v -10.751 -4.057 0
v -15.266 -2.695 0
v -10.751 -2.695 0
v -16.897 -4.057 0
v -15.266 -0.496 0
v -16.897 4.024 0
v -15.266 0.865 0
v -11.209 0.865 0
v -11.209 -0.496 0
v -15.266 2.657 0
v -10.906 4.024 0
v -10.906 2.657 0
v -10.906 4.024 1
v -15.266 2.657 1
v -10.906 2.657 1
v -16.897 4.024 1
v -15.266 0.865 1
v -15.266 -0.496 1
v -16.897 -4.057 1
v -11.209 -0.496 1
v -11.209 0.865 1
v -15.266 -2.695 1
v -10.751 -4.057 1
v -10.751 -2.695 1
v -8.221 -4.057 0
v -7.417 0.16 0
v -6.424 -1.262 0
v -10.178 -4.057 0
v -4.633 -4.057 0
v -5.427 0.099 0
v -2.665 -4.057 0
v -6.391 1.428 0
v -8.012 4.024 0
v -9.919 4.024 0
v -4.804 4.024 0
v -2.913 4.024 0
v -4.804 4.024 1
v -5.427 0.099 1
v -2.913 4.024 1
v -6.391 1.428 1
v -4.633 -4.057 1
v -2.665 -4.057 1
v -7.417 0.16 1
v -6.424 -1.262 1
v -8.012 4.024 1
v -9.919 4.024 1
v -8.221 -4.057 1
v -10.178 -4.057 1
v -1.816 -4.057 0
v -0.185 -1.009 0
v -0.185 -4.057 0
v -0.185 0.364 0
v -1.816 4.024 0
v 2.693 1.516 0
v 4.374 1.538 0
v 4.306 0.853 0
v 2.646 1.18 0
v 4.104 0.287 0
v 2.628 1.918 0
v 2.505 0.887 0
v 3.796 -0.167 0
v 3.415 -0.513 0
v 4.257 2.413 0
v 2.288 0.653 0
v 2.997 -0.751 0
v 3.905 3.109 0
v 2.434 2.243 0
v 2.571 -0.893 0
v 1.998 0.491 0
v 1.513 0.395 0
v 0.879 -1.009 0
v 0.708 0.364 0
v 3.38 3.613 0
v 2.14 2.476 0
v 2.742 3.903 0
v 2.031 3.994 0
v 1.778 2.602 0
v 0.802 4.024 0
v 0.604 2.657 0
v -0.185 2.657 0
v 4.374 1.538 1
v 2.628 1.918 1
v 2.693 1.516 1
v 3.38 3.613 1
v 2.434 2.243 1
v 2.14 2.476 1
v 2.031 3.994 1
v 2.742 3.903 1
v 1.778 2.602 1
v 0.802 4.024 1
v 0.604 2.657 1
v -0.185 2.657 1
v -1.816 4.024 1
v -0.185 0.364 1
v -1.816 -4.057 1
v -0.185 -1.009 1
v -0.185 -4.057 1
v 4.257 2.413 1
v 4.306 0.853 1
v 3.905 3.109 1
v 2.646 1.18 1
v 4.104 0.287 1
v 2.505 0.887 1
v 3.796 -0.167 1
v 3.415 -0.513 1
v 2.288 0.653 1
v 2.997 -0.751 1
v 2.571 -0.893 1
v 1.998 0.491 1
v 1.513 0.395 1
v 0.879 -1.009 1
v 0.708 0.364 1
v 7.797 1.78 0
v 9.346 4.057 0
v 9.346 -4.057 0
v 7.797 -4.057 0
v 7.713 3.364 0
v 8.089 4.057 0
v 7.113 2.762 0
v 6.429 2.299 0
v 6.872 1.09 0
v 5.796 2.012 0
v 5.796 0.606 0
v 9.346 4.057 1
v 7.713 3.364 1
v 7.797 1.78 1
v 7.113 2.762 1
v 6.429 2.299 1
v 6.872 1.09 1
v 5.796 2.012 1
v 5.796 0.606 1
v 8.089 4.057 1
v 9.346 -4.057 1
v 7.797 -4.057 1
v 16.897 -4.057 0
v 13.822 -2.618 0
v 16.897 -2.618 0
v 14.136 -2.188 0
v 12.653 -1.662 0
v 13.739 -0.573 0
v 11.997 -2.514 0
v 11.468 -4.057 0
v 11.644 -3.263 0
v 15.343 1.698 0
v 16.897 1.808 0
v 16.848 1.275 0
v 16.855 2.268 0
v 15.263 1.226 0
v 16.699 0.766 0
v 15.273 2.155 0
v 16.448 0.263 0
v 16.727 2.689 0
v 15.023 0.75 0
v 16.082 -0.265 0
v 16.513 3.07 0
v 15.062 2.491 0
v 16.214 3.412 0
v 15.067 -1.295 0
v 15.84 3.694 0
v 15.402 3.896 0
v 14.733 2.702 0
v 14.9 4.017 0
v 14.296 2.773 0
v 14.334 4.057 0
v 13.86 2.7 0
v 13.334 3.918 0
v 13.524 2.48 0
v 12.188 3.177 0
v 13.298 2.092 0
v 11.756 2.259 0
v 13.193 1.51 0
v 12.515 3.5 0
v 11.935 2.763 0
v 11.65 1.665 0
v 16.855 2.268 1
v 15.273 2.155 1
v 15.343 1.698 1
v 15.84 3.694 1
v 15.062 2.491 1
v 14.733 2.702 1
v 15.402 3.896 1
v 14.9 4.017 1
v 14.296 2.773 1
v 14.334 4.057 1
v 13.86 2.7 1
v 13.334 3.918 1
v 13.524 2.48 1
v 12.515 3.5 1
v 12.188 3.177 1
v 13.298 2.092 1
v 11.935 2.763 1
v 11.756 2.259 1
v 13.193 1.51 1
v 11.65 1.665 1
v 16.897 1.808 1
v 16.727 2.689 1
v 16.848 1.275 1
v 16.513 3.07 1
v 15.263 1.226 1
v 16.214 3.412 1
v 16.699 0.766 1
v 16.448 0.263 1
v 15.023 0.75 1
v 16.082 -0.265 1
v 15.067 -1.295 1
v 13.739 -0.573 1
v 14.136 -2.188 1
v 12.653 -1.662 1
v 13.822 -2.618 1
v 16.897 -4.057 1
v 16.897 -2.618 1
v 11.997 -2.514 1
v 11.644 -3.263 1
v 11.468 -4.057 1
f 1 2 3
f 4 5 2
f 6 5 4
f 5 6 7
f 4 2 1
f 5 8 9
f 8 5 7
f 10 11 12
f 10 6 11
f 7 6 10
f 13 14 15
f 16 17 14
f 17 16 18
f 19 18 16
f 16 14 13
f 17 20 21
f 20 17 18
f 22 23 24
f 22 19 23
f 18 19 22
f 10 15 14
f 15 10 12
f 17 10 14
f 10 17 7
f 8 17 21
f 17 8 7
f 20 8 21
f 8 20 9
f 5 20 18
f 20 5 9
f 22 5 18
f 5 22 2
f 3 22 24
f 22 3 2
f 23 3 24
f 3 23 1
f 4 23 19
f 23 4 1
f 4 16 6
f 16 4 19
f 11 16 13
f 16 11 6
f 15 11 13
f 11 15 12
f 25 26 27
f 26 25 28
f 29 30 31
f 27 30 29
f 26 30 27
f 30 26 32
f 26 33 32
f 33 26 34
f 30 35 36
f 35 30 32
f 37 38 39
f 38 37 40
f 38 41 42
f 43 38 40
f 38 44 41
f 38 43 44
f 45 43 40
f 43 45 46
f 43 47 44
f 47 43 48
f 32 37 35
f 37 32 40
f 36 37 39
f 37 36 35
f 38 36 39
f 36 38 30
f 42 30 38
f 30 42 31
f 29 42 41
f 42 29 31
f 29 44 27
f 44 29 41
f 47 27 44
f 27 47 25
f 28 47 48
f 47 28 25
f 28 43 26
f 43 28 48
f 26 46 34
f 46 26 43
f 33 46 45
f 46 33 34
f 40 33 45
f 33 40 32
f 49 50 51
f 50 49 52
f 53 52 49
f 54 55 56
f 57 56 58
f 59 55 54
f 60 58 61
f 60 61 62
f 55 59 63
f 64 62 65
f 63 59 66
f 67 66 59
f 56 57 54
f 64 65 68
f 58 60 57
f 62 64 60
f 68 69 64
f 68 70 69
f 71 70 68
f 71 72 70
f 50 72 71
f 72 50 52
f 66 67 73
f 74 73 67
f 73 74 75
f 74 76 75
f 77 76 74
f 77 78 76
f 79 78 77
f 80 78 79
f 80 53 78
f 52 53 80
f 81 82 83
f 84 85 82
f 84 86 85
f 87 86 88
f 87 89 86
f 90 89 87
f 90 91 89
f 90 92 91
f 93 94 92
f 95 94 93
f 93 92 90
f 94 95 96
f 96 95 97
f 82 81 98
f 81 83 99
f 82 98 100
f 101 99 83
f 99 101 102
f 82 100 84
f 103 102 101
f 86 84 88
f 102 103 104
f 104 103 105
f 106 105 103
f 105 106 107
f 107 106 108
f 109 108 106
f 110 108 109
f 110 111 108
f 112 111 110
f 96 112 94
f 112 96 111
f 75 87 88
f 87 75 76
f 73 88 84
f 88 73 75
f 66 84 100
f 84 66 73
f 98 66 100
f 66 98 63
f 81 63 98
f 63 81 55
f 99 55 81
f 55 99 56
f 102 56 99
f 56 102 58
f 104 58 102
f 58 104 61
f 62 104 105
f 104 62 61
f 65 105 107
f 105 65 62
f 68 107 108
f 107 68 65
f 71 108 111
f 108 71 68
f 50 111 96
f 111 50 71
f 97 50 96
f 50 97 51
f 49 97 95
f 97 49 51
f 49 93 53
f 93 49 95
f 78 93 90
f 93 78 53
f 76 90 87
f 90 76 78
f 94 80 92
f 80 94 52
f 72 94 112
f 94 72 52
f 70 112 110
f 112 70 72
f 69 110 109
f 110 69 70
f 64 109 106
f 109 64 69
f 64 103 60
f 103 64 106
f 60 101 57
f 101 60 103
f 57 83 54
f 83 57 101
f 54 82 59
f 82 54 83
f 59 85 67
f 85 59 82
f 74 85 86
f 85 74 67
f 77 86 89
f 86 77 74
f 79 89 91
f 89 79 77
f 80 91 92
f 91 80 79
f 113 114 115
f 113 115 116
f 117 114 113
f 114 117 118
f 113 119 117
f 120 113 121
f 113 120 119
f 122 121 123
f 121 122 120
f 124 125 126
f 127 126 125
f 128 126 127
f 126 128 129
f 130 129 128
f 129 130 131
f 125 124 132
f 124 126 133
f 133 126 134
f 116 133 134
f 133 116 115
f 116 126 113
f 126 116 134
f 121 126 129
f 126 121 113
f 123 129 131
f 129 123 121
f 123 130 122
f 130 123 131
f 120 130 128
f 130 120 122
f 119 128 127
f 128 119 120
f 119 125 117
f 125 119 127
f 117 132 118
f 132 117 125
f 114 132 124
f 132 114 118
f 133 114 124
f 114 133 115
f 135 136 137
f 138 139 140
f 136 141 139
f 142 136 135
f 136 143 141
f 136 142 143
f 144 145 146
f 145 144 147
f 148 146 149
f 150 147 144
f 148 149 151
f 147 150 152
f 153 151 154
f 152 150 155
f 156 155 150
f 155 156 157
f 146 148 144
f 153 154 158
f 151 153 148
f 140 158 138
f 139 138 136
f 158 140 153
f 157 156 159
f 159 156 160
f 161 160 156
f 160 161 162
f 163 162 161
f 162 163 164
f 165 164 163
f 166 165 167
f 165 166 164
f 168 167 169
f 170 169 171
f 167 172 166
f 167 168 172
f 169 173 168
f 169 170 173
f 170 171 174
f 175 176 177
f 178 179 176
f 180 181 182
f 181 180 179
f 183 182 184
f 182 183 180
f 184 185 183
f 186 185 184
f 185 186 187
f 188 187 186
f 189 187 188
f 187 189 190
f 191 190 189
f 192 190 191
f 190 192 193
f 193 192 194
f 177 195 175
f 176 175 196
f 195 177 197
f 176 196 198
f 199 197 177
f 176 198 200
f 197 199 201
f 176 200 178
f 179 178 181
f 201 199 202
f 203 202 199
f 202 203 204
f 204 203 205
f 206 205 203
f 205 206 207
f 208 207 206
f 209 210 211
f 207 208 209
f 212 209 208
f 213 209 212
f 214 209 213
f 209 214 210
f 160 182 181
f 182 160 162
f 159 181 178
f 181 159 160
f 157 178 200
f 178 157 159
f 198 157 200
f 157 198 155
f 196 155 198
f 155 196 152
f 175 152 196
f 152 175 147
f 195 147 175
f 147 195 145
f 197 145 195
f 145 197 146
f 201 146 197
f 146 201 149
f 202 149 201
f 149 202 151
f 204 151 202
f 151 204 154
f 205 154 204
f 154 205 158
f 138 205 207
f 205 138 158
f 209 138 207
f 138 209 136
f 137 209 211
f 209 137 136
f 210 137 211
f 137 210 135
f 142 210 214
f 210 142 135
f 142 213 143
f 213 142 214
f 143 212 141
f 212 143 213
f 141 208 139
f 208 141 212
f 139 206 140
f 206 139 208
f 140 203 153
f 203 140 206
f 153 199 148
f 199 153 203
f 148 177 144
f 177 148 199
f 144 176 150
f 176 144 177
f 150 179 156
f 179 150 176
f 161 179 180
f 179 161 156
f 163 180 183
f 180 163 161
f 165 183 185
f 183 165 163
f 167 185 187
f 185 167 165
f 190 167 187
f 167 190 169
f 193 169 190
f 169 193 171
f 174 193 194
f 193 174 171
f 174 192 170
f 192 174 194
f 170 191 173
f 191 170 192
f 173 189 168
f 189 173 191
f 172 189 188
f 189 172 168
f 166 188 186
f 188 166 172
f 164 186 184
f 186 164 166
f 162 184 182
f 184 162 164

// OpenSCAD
// Module names are of the form poly_<inkscape-path-id>().
// As a result you can associate a polygon in this OpenSCAD program with the
//  corresponding SVG element in the Inkscape document by looking for 
//  the XML element with the attribute id="inkscape-path-id".

// Paths have their own variables so they can be imported and used 
//  in polygon(points) structures in other programs.
// The NN_points is the list of all polygon XY vertices. 
// There may be an NN_paths variable as well. If it exists then it 
//  defines the nested paths. Both must be used in the 
//  polygon(points, paths) variant of the command.

profile_scale = 25.4/90; //made in inkscape in mm

// helper functions to determine the X,Y dimensions of the profiles
function min_x(shape_points) = min([ for (x = shape_points) min(x[0])]);
function max_x(shape_points) = max([ for (x = shape_points) max(x[0])]);
function min_y(shape_points) = min([ for (x = shape_points) min(x[1])]);
function max_y(shape_points) = max([ for (x = shape_points) max(x[1])]);

height = 1;
width = 1.0;


E_pisemno_points = [[-59.873045,14.375000],[-59.873045,-14.257820],[-38.642575,-14.257820],[-38.642575,-9.414070],[-54.091795,-9.414070],[-54.091795,-3.066410],[-39.716795,-3.066410],[-39.716795,1.757810],[-54.091795,1.757810],[-54.091795,9.550780],[-38.095705,9.550780],[-38.095705,14.375000],[-59.873045,14.375000],[-59.873045,14.375000]];

module E_pisemno(h, w, res=4)  {
  scale([profile_scale, -profile_scale, 1])
  union()  {
    linear_extrude(height=h)
      polygon(E_pisemno_points);
  }
}

X_pisemno_points = [[-36.064455,14.375000],[-26.279295,-0.566410],[-35.146485,-14.257820],[-28.388675,-14.257820],[-22.646485,-5.058600],[-17.021485,-14.257820],[-10.322265,-14.257820],[-19.228515,-0.351570],[-9.443355,14.375000],[-16.416015,14.375000],[-22.763675,4.472650],[-29.130855,14.375000],[-36.064455,14.375000],[-36.064455,14.375000]];

module X_pisemno(h, w, res=4)  {
  scale([profile_scale, -profile_scale, 1])
  union()  {
    linear_extrude(height=h)
      polygon(X_pisemno_points);
  }
}

P_pisemno_points = [[-6.435545,14.375000],[-6.435545,-14.257820],[2.841795,-14.257820],[7.197265,-14.150398],[9.716795,-13.828130],[11.977540,-12.802740],[13.837895,-11.015630],[15.083007,-8.549808],[15.498045,-5.449220],[15.258787,-3.022463],[14.541015,-1.015630],[13.452147,0.590817],[12.099605,1.816400],[10.620115,2.661130],[9.111325,3.164060],[3.115235,3.574220],[-0.654295,3.574220],[-0.654295,14.375000],[-6.435545,14.375000],[-6.435545,14.375000],[-0.654295,-9.414070],[-0.654295,-1.289070],[2.509765,-1.289070],[5.361327,-1.401373],[7.080075,-1.738280],[8.105470,-2.314453],[8.876955,-3.144530],[9.375000,-4.179693],[9.541015,-5.371100],[9.311522,-6.796880],[8.623045,-7.949220],[7.583005,-8.774418],[6.298825,-9.218750],[2.138675,-9.414070],[-0.654295,-9.414070],[-0.654295,-9.414070]];
P_pisemno_paths = [[0,1,2,3,4,5,6,7,8,9,10,11,12,13,14,15,16,17,18,19],
				[20,21,22,23,24,25,26,27,28,29,30,31,32,33,34,35]];

module P_pisemno(h, w, res=4)  {
  scale([profile_scale, -profile_scale, 1])
  union()  {
    linear_extrude(height=h)
      polygon(P_pisemno_points, P_pisemno_paths);
  }
}

cislo_1_points = [[33.115235,14.375000],[27.626955,14.375000],[27.626955,-6.308600],[24.350587,-3.862310],[20.537105,-2.148440],[20.537105,-7.128910],[22.778317,-8.144533],[25.205075,-9.785160],[27.329098,-11.918950],[28.662105,-14.375000],[33.115235,-14.375000],[33.115235,14.375000],[33.115235,14.375000]];

module cislo_1(h, w, res=4)  {
  scale([profile_scale, -profile_scale, 1])
  union()  {
    linear_extrude(height=h)
      polygon(cislo_1_points);
  }
}

cislo_2_points = [[59.873045,9.277340],[59.873045,14.375000],[40.634765,14.375000],[41.259765,11.562497],[42.509765,8.906250],[44.833985,5.888670],[48.681645,2.031250],[53.232425,-2.656250],[54.082032,-4.345705],[54.365235,-6.015630],[54.116212,-7.636725],[53.369145,-8.828130],[52.202147,-9.575198],[50.654295,-9.824220],[49.111327,-9.565433],[47.919925,-8.789070],[47.119140,-7.412115],[46.748045,-5.351570],[41.279295,-5.898440],[41.654051,-8.004153],[42.290037,-9.790043],[43.187256,-11.256108],[44.345705,-12.402350],[47.246093,-13.881838],[50.791015,-14.375000],[52.796630,-14.232178],[54.575195,-13.803713],[56.126710,-13.089603],[57.451175,-12.089850],[58.510743,-10.877690],[59.267577,-9.526370],[59.721678,-8.035890],[59.873045,-6.406250],[59.697265,-4.516605],[59.169925,-2.714850],[58.281250,-0.932623],[56.982425,0.937500],[53.388675,4.589840],[50.087895,7.753900],[48.974605,9.277340],[59.873045,9.277340],[59.873045,9.277340]];

module cislo_2(h, w, res=4)  {
  scale([profile_scale, -profile_scale, 1])
  union()  {
    linear_extrude(height=h)
      polygon(cislo_2_points);
  }
}

// The shapes
E_pisemno(height, width);
X_pisemno(height, width);
P_pisemno(height, width);
cislo_1(height, width);
cislo_2(height, width);
